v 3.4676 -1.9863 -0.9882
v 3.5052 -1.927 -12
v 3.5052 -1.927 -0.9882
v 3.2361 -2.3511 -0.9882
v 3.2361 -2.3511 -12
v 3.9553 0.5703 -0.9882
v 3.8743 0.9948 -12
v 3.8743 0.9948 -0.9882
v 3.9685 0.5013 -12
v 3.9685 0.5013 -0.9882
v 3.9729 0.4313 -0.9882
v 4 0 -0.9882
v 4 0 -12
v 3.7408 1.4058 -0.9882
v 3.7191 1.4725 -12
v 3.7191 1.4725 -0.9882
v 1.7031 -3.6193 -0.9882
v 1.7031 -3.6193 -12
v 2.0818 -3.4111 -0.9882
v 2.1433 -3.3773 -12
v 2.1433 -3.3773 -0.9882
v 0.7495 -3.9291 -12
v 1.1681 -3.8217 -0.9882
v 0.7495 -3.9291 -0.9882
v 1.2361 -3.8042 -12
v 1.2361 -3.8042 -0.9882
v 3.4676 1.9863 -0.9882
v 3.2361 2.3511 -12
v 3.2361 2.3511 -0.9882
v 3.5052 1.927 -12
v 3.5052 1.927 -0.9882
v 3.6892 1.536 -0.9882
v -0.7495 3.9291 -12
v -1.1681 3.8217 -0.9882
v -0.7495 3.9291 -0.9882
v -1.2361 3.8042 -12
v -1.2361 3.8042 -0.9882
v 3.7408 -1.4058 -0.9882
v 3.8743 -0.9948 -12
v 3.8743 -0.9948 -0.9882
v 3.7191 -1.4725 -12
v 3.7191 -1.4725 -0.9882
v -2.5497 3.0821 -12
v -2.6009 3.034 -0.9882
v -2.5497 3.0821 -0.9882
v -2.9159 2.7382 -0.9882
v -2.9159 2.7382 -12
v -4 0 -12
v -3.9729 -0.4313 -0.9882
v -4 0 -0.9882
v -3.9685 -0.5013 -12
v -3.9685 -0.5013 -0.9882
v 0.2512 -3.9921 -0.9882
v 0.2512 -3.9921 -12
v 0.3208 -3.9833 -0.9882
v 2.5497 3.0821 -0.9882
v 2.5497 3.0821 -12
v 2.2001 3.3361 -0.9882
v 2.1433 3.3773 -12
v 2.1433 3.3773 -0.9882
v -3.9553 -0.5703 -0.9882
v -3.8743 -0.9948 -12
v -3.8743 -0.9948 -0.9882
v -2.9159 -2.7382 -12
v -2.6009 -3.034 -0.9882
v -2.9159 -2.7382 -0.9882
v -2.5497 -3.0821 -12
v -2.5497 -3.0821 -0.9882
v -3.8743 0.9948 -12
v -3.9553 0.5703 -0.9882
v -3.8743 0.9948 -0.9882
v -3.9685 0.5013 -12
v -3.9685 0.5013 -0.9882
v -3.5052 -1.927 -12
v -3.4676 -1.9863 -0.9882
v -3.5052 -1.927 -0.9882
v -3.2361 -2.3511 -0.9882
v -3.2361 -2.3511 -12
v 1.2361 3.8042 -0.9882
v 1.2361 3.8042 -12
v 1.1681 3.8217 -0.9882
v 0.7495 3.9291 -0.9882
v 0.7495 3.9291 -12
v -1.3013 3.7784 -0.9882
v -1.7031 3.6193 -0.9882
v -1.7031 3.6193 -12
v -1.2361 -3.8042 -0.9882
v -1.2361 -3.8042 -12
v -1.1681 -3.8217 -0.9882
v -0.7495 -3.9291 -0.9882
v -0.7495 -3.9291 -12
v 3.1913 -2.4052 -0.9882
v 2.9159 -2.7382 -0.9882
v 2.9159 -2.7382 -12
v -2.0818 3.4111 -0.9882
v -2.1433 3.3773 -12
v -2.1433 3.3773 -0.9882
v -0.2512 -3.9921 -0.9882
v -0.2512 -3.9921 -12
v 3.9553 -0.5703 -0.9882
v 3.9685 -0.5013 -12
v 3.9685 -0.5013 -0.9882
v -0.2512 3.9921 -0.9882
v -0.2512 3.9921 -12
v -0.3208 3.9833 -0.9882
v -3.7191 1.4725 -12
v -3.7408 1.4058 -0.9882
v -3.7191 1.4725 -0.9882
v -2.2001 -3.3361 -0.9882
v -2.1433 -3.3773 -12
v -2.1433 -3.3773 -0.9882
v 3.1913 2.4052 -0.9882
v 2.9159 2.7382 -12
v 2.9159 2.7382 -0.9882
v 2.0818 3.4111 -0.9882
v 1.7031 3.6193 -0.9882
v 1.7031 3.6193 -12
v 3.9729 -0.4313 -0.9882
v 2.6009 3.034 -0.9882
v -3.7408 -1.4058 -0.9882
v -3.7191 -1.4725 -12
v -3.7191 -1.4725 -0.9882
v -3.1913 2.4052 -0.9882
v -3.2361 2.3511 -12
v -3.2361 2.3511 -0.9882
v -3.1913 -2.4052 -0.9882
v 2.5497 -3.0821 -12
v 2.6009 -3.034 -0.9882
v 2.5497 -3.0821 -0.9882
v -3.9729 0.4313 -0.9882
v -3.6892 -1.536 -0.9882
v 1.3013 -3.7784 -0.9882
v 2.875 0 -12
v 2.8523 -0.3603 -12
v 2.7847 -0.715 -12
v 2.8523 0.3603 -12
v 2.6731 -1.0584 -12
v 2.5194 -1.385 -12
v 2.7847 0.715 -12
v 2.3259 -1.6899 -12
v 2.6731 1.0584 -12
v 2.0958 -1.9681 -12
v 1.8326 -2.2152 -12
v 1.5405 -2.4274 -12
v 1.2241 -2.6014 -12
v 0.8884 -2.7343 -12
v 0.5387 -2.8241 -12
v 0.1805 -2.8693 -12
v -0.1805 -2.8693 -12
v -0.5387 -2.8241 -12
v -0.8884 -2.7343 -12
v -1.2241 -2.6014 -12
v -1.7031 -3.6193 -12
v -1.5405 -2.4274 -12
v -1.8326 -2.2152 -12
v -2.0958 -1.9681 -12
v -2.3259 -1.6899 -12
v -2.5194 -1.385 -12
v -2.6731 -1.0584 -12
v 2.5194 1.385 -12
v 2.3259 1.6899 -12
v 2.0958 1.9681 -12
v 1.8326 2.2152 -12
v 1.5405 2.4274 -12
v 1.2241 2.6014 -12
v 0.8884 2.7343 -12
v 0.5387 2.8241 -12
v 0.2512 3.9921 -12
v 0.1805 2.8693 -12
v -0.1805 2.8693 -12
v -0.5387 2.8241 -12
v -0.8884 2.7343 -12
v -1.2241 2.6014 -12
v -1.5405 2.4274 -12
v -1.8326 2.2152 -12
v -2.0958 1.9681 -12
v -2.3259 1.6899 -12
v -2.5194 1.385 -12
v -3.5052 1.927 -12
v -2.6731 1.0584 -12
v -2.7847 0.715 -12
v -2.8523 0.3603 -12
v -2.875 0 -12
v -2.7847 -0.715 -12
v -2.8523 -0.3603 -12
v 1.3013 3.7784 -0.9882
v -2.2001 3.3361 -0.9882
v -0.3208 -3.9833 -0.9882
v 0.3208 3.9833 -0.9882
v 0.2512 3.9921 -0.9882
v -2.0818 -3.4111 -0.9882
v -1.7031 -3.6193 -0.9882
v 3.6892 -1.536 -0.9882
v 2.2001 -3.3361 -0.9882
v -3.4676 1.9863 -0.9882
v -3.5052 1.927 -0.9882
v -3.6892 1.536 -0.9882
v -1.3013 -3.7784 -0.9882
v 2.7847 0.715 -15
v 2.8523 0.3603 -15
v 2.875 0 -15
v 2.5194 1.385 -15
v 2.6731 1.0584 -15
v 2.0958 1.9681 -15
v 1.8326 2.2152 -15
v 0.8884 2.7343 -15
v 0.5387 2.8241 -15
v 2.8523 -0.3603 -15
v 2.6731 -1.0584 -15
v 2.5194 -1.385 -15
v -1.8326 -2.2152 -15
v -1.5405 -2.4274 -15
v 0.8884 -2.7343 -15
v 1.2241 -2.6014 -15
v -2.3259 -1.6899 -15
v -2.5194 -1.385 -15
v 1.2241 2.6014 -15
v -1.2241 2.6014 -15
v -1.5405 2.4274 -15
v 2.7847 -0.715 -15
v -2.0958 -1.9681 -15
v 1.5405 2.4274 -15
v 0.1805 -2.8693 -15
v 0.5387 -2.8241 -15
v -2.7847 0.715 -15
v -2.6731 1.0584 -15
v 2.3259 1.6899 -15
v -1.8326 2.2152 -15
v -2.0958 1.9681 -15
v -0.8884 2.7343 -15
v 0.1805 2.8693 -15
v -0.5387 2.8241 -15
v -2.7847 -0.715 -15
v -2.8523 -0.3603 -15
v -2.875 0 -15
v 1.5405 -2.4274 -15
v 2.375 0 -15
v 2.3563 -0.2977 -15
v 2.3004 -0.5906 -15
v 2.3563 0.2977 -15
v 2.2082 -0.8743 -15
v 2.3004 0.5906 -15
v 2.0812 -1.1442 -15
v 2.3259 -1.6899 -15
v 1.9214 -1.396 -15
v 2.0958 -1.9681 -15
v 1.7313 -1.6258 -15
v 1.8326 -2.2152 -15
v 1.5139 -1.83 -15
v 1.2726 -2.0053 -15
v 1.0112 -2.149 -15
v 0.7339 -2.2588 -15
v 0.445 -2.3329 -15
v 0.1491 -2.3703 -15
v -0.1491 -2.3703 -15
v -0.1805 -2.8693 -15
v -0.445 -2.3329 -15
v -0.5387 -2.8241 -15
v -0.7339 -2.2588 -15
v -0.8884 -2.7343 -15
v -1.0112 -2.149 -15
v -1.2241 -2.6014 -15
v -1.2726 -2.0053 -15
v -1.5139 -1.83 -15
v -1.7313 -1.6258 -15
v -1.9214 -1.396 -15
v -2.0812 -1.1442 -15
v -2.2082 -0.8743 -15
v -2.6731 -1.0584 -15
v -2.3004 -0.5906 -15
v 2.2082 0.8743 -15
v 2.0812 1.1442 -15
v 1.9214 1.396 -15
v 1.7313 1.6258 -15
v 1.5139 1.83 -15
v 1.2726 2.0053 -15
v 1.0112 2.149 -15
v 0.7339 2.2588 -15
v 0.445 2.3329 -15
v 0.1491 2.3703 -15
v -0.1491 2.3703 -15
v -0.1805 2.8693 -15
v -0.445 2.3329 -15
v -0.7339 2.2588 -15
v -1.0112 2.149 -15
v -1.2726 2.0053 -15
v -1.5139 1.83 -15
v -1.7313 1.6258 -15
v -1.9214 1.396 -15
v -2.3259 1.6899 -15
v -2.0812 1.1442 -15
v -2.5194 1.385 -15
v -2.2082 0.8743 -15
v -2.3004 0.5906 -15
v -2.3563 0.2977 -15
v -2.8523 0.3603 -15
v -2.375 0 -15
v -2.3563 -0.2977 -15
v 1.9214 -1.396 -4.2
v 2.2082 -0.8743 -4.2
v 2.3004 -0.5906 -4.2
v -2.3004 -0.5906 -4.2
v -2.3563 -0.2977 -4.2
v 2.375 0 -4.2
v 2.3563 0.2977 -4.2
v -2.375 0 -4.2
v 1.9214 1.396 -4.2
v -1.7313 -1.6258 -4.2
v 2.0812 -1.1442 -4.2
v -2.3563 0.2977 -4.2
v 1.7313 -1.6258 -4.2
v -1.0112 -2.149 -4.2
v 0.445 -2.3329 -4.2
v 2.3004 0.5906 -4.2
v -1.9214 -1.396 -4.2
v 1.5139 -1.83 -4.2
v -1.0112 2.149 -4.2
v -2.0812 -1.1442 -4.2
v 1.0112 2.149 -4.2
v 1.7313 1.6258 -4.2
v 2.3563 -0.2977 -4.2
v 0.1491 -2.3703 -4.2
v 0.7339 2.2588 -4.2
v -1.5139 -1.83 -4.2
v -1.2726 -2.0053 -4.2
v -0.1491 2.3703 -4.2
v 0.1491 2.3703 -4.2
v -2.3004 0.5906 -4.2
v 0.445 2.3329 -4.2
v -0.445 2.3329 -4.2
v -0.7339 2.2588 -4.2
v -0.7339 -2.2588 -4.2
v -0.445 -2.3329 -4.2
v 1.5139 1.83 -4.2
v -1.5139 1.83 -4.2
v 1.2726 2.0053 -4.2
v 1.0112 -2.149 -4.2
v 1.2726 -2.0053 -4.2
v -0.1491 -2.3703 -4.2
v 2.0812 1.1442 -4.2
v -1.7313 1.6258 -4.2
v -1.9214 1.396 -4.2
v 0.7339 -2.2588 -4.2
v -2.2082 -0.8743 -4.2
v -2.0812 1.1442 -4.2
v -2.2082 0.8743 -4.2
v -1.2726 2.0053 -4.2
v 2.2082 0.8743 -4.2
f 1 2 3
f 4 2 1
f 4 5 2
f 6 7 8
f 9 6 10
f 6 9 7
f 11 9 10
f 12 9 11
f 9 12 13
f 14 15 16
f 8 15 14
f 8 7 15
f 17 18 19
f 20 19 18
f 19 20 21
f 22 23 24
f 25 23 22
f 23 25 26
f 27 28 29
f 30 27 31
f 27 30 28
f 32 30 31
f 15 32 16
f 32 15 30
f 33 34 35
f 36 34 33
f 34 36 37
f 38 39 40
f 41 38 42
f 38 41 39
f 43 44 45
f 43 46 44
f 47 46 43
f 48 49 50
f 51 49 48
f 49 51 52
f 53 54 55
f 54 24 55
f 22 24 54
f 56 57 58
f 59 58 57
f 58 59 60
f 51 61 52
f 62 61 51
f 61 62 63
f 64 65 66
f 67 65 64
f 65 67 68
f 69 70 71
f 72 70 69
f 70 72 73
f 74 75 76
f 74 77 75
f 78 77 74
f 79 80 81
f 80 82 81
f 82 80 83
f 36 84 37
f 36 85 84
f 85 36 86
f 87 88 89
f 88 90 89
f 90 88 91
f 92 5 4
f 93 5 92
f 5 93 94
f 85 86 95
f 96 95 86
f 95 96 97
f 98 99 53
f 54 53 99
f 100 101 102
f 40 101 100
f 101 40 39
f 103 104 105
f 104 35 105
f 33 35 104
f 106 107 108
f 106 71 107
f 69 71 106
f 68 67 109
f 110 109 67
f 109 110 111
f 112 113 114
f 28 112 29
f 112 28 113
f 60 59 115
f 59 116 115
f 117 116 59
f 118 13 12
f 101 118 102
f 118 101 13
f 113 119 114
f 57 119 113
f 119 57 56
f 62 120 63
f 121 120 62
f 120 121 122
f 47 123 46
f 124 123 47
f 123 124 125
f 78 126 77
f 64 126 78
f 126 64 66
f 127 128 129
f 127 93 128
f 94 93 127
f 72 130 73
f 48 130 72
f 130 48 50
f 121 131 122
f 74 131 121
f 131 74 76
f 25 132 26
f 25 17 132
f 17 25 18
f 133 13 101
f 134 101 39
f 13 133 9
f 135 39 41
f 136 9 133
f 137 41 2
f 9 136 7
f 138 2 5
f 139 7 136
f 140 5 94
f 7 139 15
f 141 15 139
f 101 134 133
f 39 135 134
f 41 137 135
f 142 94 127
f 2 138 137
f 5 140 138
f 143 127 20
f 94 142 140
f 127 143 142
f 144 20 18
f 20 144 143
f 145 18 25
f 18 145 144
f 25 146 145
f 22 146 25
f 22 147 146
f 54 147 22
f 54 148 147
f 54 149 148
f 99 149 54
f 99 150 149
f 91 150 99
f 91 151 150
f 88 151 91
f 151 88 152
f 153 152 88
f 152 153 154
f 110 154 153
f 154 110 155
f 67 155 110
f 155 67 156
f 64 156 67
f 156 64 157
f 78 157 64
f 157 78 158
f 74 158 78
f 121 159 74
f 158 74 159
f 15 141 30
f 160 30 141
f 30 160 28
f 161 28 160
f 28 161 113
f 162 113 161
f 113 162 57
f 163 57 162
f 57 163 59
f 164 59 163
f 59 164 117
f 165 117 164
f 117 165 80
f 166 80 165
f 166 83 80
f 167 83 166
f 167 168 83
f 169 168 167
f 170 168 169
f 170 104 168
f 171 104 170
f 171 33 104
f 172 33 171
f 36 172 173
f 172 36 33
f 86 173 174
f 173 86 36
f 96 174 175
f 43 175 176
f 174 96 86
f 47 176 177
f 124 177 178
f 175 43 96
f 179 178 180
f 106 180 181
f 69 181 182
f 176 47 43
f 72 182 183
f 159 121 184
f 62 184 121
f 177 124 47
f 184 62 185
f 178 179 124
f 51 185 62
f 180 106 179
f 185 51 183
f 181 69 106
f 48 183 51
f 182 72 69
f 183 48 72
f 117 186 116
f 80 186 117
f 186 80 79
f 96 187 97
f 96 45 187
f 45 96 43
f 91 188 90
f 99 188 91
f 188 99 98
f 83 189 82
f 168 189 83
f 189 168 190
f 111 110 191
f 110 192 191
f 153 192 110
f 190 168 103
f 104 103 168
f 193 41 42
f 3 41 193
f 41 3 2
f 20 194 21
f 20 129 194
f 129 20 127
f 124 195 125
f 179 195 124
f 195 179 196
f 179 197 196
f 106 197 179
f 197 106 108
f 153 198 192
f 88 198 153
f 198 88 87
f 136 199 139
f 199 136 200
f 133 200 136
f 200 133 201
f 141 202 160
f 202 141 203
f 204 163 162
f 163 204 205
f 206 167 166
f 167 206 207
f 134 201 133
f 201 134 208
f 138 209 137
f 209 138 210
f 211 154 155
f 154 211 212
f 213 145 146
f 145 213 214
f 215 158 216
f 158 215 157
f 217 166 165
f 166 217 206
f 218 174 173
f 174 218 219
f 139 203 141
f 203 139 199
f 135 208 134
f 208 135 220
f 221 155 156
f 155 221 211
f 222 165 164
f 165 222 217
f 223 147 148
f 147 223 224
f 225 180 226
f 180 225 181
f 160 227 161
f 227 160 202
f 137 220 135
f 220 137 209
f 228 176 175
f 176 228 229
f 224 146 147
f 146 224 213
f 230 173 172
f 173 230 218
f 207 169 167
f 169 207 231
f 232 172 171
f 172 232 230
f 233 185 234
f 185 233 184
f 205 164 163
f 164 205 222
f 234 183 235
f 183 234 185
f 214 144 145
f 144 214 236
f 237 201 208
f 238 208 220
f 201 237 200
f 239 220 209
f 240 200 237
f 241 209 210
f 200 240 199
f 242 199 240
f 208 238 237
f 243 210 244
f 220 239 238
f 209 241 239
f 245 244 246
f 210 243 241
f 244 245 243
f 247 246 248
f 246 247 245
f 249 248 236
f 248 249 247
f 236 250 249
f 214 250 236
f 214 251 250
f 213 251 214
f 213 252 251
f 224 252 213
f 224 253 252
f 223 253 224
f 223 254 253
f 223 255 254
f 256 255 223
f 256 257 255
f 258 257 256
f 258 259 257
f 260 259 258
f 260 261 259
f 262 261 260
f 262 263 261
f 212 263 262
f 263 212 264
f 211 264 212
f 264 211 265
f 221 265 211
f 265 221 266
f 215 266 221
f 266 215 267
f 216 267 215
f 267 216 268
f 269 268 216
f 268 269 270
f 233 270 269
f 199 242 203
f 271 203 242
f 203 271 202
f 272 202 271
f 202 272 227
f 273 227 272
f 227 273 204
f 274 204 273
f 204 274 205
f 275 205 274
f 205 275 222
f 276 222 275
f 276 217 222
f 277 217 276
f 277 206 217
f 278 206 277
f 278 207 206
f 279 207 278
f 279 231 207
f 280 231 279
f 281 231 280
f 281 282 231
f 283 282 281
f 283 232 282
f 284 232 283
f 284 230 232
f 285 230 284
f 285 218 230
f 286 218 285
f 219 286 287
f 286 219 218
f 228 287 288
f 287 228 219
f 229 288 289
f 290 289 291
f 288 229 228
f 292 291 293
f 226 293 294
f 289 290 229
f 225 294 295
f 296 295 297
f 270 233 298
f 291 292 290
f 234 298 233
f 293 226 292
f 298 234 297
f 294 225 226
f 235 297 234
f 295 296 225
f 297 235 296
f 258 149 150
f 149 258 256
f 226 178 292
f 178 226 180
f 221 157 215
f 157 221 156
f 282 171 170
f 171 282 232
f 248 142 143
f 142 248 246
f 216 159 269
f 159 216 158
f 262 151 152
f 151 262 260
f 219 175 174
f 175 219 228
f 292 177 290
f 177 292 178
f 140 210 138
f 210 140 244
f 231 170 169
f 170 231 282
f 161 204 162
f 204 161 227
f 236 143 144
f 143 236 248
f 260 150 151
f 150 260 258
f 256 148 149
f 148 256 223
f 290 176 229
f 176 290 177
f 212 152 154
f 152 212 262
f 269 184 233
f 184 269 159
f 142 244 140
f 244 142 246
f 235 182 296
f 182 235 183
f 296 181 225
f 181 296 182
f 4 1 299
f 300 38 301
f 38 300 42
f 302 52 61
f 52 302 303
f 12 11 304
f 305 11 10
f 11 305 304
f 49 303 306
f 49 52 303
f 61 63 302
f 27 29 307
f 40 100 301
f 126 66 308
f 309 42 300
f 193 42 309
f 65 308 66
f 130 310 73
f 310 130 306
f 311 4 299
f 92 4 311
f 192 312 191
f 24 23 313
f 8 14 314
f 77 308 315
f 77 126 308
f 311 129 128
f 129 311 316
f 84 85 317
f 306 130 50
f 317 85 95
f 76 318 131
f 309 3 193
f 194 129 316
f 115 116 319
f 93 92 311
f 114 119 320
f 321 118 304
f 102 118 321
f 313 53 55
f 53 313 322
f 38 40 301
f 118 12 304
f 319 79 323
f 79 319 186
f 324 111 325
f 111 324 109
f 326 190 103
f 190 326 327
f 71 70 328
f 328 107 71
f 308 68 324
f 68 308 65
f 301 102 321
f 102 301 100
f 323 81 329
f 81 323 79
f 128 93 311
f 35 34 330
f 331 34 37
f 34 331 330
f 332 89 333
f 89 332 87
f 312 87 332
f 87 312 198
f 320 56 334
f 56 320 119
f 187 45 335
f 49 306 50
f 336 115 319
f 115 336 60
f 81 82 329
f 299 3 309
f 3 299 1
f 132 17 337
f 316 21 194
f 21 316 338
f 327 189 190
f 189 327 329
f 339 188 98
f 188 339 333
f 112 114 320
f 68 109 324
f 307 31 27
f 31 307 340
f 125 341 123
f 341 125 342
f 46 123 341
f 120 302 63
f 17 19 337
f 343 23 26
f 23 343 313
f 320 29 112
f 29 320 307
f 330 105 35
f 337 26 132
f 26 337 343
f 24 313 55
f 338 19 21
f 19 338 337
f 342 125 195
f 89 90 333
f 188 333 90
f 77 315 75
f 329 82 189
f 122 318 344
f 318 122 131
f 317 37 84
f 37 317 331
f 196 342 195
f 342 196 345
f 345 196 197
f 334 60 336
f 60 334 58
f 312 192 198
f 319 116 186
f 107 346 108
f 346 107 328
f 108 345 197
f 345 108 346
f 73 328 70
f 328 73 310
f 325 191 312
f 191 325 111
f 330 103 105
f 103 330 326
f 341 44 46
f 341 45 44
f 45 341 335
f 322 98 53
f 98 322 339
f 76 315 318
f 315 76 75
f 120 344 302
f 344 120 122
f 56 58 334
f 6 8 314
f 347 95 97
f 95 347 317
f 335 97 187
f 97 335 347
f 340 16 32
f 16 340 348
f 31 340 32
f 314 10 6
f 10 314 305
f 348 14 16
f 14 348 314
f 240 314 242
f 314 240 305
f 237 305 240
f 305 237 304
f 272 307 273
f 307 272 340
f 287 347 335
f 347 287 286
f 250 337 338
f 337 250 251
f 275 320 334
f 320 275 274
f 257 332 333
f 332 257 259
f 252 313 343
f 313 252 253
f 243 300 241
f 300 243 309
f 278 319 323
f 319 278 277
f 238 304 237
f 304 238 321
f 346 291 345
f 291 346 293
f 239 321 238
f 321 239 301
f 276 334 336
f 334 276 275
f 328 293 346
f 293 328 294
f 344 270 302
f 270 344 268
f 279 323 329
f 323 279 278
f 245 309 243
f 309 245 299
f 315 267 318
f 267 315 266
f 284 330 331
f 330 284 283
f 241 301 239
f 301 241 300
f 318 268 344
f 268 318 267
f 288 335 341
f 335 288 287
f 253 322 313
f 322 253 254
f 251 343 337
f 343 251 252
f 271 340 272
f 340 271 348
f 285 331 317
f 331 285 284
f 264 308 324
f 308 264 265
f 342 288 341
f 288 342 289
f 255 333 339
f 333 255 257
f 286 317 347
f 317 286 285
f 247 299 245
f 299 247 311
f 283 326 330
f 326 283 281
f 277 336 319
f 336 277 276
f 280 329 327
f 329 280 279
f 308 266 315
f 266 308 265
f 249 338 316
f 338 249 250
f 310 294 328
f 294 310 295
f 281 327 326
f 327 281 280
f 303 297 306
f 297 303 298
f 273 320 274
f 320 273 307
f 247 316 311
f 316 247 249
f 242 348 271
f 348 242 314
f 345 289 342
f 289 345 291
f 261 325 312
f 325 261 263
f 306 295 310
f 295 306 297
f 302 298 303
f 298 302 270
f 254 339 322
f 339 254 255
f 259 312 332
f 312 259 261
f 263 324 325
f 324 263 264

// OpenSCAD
$fn = 50;

difference() {
	union() {
		translate(v = [0, 0, -12.0]) {
			cylinder(h = 12, r = 4.0);
		}
		#translate(v = [0, 0, -15.0]) {
			cylinder(h = 15, r = 2.875);
		}
	}
	union() {
		translate(v = [0, 0, 0]) {
			rotate(a = [0, 0, 0]) {
				difference() {
					union() {
						translate(v = [0, 0, -15.0]) {
							cylinder(h = 15, r = 2.25);
						}
						translate(v = [0, 0, -4.2]) {
							cylinder(h = 4.2, r1 = 2.375, r2 = 4.5);
						}
						translate(v = [0, 0, -15.0]) {
							cylinder(h = 15, r = 2.375);
						}
						translate(v = [0, 0, -15.0]) {
							cylinder(h = 15, r = 2.25);
						}
					}
					union();
				}
			}
		}
	}
}
